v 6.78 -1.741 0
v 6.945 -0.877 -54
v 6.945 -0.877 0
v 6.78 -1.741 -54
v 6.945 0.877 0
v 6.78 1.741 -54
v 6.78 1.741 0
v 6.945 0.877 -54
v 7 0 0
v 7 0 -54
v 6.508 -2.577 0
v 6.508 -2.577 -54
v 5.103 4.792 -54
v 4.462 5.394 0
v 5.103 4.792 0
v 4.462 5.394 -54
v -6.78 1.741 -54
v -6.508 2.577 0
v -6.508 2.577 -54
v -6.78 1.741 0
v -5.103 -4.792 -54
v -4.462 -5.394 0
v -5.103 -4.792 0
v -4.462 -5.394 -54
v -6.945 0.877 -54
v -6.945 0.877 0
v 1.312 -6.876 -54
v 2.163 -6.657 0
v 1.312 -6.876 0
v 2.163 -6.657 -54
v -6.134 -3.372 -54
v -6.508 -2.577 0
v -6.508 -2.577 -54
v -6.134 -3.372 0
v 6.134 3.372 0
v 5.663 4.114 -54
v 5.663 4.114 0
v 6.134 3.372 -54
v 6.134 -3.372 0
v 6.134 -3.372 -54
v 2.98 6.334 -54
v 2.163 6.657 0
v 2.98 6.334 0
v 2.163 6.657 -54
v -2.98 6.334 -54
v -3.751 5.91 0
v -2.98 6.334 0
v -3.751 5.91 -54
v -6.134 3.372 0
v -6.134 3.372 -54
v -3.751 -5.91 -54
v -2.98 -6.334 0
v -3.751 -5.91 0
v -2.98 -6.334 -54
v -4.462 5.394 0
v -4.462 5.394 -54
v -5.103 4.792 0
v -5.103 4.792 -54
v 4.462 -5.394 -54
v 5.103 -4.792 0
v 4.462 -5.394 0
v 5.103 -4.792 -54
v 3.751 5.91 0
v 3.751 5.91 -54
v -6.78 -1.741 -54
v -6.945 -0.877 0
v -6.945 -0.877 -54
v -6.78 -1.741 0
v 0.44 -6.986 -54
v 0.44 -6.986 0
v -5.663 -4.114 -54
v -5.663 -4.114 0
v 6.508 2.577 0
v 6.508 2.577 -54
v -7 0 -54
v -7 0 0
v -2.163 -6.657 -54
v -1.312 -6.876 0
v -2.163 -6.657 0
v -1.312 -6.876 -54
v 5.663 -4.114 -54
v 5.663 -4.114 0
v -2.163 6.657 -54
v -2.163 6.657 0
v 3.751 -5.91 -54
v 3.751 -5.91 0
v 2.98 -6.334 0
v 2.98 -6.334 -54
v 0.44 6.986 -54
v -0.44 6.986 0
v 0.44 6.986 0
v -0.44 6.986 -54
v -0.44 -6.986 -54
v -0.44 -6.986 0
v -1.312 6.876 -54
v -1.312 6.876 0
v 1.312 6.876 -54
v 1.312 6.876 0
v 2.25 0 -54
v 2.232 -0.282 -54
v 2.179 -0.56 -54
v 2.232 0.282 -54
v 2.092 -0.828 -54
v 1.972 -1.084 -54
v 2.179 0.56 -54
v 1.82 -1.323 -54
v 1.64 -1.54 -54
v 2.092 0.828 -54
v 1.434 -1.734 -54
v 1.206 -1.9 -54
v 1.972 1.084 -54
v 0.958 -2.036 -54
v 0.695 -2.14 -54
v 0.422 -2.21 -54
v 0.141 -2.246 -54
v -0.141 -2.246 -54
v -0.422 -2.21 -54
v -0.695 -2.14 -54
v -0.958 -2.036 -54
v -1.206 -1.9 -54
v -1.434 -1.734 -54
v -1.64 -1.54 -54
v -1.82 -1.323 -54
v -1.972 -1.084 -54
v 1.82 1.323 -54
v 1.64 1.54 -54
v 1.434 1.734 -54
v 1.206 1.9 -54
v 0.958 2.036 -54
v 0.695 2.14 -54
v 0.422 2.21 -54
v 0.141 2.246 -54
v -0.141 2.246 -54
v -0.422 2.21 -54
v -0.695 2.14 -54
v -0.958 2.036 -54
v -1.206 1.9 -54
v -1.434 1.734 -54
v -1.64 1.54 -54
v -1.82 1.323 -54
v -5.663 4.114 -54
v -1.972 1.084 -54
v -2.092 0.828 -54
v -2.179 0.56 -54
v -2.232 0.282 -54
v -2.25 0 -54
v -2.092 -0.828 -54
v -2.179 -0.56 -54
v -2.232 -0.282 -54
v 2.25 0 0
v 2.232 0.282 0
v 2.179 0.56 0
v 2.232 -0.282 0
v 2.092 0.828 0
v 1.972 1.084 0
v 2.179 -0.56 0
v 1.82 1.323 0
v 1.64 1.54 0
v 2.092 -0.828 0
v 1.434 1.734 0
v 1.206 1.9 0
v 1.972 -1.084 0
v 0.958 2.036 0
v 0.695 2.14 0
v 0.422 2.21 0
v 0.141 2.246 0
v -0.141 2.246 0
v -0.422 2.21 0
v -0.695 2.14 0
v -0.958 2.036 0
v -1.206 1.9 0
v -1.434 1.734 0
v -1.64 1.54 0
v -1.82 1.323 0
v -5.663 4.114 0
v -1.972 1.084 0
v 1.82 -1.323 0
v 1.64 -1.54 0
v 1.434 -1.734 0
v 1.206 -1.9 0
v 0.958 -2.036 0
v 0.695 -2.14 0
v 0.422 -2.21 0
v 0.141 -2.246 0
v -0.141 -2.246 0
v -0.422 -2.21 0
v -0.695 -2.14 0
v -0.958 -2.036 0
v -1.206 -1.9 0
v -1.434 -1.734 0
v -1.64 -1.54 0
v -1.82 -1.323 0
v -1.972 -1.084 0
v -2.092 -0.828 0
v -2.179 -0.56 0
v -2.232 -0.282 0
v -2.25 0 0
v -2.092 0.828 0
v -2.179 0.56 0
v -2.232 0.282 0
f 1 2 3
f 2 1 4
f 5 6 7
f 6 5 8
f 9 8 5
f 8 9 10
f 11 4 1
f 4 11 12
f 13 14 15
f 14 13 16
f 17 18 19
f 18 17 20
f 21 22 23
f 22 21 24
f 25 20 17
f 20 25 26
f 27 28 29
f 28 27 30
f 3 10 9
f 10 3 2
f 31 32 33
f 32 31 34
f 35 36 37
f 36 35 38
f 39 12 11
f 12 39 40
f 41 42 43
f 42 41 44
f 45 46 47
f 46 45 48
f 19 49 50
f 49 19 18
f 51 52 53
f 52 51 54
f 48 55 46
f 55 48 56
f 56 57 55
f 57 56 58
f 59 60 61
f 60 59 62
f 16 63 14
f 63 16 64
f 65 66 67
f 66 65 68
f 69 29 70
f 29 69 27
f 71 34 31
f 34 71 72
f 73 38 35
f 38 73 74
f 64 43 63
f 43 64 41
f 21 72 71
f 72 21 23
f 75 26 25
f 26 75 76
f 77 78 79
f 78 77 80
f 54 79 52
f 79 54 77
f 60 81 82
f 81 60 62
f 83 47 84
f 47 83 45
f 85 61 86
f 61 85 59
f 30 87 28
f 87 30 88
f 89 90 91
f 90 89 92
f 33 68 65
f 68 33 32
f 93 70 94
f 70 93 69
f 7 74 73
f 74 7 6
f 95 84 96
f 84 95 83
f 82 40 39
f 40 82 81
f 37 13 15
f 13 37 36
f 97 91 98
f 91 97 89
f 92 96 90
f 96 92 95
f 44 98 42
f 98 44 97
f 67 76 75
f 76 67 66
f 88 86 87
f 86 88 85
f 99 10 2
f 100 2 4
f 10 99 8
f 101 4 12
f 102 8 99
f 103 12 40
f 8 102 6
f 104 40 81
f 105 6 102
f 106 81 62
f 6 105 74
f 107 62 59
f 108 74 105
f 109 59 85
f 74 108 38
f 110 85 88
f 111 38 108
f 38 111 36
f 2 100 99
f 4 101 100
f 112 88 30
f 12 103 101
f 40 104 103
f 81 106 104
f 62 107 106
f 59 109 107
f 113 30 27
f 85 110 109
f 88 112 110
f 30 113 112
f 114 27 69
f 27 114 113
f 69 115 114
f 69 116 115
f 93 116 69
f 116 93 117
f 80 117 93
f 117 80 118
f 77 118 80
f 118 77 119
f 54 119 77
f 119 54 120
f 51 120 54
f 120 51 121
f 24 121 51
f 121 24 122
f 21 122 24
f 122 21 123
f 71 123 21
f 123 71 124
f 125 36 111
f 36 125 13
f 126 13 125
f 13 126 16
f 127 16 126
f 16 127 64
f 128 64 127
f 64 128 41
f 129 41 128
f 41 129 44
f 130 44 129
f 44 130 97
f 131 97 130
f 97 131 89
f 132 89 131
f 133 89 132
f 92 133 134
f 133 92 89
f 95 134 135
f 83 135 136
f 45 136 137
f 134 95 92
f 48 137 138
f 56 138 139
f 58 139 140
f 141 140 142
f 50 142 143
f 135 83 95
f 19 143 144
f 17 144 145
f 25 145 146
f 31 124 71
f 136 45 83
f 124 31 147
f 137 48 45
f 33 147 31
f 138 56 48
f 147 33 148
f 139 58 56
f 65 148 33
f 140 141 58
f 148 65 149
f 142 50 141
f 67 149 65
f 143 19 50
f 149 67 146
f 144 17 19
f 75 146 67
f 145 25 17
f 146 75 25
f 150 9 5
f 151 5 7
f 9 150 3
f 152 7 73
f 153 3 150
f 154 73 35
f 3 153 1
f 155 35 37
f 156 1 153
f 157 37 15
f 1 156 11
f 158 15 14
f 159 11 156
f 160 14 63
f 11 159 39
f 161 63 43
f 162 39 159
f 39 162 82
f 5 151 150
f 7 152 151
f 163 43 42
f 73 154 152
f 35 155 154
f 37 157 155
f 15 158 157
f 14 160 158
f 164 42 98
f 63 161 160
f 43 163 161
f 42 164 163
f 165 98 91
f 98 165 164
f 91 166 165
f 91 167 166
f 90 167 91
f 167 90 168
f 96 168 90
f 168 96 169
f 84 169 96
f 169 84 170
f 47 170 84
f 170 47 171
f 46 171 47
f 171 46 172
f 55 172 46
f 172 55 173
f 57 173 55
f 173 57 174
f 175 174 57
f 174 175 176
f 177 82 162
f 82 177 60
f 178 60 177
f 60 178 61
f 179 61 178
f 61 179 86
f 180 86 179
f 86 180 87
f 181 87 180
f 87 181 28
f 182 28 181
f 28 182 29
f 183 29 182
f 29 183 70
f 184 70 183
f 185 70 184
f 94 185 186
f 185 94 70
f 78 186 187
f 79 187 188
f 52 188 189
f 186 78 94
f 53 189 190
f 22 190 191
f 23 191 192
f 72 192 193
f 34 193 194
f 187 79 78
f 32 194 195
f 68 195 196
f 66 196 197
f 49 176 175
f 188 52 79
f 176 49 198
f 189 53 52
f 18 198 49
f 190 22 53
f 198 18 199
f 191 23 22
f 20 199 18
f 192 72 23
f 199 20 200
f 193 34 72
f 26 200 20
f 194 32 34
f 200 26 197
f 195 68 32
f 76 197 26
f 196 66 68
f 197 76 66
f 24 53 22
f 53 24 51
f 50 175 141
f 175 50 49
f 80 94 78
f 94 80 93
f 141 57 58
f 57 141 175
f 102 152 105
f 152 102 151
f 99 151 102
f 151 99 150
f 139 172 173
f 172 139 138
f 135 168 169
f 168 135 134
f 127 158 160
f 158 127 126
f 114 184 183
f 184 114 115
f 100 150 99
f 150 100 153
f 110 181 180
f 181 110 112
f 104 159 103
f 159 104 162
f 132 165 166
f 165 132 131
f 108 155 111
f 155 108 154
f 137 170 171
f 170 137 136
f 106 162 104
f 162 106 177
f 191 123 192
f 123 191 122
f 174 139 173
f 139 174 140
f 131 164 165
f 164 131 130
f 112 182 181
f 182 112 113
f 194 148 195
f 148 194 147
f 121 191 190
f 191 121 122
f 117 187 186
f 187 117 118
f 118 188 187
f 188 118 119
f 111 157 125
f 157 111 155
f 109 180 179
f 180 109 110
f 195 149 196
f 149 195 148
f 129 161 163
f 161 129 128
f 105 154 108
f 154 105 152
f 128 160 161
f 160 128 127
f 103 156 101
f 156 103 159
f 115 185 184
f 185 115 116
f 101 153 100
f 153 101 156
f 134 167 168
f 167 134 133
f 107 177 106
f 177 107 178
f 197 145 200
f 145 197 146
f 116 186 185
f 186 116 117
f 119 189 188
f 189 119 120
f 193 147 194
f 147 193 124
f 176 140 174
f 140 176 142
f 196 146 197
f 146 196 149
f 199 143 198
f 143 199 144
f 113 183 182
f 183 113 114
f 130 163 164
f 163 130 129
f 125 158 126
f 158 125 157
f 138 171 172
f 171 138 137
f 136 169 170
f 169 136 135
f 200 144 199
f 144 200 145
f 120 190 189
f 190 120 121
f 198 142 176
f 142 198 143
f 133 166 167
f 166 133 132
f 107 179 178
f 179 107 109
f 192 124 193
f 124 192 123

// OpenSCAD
$fn = 50;


difference() {
	union() {
		translate(v = [0, 0, -54.0000000000]) {
			cylinder(h = 54, r = 7.0000000000);
		}
		cylinder(h = 0, r = 16.0000000000);
	}
	union() {
		#translate(v = [0, 0, -54]) {
			cylinder(h = 54, r = 2.2500000000);
		}
	}
}
